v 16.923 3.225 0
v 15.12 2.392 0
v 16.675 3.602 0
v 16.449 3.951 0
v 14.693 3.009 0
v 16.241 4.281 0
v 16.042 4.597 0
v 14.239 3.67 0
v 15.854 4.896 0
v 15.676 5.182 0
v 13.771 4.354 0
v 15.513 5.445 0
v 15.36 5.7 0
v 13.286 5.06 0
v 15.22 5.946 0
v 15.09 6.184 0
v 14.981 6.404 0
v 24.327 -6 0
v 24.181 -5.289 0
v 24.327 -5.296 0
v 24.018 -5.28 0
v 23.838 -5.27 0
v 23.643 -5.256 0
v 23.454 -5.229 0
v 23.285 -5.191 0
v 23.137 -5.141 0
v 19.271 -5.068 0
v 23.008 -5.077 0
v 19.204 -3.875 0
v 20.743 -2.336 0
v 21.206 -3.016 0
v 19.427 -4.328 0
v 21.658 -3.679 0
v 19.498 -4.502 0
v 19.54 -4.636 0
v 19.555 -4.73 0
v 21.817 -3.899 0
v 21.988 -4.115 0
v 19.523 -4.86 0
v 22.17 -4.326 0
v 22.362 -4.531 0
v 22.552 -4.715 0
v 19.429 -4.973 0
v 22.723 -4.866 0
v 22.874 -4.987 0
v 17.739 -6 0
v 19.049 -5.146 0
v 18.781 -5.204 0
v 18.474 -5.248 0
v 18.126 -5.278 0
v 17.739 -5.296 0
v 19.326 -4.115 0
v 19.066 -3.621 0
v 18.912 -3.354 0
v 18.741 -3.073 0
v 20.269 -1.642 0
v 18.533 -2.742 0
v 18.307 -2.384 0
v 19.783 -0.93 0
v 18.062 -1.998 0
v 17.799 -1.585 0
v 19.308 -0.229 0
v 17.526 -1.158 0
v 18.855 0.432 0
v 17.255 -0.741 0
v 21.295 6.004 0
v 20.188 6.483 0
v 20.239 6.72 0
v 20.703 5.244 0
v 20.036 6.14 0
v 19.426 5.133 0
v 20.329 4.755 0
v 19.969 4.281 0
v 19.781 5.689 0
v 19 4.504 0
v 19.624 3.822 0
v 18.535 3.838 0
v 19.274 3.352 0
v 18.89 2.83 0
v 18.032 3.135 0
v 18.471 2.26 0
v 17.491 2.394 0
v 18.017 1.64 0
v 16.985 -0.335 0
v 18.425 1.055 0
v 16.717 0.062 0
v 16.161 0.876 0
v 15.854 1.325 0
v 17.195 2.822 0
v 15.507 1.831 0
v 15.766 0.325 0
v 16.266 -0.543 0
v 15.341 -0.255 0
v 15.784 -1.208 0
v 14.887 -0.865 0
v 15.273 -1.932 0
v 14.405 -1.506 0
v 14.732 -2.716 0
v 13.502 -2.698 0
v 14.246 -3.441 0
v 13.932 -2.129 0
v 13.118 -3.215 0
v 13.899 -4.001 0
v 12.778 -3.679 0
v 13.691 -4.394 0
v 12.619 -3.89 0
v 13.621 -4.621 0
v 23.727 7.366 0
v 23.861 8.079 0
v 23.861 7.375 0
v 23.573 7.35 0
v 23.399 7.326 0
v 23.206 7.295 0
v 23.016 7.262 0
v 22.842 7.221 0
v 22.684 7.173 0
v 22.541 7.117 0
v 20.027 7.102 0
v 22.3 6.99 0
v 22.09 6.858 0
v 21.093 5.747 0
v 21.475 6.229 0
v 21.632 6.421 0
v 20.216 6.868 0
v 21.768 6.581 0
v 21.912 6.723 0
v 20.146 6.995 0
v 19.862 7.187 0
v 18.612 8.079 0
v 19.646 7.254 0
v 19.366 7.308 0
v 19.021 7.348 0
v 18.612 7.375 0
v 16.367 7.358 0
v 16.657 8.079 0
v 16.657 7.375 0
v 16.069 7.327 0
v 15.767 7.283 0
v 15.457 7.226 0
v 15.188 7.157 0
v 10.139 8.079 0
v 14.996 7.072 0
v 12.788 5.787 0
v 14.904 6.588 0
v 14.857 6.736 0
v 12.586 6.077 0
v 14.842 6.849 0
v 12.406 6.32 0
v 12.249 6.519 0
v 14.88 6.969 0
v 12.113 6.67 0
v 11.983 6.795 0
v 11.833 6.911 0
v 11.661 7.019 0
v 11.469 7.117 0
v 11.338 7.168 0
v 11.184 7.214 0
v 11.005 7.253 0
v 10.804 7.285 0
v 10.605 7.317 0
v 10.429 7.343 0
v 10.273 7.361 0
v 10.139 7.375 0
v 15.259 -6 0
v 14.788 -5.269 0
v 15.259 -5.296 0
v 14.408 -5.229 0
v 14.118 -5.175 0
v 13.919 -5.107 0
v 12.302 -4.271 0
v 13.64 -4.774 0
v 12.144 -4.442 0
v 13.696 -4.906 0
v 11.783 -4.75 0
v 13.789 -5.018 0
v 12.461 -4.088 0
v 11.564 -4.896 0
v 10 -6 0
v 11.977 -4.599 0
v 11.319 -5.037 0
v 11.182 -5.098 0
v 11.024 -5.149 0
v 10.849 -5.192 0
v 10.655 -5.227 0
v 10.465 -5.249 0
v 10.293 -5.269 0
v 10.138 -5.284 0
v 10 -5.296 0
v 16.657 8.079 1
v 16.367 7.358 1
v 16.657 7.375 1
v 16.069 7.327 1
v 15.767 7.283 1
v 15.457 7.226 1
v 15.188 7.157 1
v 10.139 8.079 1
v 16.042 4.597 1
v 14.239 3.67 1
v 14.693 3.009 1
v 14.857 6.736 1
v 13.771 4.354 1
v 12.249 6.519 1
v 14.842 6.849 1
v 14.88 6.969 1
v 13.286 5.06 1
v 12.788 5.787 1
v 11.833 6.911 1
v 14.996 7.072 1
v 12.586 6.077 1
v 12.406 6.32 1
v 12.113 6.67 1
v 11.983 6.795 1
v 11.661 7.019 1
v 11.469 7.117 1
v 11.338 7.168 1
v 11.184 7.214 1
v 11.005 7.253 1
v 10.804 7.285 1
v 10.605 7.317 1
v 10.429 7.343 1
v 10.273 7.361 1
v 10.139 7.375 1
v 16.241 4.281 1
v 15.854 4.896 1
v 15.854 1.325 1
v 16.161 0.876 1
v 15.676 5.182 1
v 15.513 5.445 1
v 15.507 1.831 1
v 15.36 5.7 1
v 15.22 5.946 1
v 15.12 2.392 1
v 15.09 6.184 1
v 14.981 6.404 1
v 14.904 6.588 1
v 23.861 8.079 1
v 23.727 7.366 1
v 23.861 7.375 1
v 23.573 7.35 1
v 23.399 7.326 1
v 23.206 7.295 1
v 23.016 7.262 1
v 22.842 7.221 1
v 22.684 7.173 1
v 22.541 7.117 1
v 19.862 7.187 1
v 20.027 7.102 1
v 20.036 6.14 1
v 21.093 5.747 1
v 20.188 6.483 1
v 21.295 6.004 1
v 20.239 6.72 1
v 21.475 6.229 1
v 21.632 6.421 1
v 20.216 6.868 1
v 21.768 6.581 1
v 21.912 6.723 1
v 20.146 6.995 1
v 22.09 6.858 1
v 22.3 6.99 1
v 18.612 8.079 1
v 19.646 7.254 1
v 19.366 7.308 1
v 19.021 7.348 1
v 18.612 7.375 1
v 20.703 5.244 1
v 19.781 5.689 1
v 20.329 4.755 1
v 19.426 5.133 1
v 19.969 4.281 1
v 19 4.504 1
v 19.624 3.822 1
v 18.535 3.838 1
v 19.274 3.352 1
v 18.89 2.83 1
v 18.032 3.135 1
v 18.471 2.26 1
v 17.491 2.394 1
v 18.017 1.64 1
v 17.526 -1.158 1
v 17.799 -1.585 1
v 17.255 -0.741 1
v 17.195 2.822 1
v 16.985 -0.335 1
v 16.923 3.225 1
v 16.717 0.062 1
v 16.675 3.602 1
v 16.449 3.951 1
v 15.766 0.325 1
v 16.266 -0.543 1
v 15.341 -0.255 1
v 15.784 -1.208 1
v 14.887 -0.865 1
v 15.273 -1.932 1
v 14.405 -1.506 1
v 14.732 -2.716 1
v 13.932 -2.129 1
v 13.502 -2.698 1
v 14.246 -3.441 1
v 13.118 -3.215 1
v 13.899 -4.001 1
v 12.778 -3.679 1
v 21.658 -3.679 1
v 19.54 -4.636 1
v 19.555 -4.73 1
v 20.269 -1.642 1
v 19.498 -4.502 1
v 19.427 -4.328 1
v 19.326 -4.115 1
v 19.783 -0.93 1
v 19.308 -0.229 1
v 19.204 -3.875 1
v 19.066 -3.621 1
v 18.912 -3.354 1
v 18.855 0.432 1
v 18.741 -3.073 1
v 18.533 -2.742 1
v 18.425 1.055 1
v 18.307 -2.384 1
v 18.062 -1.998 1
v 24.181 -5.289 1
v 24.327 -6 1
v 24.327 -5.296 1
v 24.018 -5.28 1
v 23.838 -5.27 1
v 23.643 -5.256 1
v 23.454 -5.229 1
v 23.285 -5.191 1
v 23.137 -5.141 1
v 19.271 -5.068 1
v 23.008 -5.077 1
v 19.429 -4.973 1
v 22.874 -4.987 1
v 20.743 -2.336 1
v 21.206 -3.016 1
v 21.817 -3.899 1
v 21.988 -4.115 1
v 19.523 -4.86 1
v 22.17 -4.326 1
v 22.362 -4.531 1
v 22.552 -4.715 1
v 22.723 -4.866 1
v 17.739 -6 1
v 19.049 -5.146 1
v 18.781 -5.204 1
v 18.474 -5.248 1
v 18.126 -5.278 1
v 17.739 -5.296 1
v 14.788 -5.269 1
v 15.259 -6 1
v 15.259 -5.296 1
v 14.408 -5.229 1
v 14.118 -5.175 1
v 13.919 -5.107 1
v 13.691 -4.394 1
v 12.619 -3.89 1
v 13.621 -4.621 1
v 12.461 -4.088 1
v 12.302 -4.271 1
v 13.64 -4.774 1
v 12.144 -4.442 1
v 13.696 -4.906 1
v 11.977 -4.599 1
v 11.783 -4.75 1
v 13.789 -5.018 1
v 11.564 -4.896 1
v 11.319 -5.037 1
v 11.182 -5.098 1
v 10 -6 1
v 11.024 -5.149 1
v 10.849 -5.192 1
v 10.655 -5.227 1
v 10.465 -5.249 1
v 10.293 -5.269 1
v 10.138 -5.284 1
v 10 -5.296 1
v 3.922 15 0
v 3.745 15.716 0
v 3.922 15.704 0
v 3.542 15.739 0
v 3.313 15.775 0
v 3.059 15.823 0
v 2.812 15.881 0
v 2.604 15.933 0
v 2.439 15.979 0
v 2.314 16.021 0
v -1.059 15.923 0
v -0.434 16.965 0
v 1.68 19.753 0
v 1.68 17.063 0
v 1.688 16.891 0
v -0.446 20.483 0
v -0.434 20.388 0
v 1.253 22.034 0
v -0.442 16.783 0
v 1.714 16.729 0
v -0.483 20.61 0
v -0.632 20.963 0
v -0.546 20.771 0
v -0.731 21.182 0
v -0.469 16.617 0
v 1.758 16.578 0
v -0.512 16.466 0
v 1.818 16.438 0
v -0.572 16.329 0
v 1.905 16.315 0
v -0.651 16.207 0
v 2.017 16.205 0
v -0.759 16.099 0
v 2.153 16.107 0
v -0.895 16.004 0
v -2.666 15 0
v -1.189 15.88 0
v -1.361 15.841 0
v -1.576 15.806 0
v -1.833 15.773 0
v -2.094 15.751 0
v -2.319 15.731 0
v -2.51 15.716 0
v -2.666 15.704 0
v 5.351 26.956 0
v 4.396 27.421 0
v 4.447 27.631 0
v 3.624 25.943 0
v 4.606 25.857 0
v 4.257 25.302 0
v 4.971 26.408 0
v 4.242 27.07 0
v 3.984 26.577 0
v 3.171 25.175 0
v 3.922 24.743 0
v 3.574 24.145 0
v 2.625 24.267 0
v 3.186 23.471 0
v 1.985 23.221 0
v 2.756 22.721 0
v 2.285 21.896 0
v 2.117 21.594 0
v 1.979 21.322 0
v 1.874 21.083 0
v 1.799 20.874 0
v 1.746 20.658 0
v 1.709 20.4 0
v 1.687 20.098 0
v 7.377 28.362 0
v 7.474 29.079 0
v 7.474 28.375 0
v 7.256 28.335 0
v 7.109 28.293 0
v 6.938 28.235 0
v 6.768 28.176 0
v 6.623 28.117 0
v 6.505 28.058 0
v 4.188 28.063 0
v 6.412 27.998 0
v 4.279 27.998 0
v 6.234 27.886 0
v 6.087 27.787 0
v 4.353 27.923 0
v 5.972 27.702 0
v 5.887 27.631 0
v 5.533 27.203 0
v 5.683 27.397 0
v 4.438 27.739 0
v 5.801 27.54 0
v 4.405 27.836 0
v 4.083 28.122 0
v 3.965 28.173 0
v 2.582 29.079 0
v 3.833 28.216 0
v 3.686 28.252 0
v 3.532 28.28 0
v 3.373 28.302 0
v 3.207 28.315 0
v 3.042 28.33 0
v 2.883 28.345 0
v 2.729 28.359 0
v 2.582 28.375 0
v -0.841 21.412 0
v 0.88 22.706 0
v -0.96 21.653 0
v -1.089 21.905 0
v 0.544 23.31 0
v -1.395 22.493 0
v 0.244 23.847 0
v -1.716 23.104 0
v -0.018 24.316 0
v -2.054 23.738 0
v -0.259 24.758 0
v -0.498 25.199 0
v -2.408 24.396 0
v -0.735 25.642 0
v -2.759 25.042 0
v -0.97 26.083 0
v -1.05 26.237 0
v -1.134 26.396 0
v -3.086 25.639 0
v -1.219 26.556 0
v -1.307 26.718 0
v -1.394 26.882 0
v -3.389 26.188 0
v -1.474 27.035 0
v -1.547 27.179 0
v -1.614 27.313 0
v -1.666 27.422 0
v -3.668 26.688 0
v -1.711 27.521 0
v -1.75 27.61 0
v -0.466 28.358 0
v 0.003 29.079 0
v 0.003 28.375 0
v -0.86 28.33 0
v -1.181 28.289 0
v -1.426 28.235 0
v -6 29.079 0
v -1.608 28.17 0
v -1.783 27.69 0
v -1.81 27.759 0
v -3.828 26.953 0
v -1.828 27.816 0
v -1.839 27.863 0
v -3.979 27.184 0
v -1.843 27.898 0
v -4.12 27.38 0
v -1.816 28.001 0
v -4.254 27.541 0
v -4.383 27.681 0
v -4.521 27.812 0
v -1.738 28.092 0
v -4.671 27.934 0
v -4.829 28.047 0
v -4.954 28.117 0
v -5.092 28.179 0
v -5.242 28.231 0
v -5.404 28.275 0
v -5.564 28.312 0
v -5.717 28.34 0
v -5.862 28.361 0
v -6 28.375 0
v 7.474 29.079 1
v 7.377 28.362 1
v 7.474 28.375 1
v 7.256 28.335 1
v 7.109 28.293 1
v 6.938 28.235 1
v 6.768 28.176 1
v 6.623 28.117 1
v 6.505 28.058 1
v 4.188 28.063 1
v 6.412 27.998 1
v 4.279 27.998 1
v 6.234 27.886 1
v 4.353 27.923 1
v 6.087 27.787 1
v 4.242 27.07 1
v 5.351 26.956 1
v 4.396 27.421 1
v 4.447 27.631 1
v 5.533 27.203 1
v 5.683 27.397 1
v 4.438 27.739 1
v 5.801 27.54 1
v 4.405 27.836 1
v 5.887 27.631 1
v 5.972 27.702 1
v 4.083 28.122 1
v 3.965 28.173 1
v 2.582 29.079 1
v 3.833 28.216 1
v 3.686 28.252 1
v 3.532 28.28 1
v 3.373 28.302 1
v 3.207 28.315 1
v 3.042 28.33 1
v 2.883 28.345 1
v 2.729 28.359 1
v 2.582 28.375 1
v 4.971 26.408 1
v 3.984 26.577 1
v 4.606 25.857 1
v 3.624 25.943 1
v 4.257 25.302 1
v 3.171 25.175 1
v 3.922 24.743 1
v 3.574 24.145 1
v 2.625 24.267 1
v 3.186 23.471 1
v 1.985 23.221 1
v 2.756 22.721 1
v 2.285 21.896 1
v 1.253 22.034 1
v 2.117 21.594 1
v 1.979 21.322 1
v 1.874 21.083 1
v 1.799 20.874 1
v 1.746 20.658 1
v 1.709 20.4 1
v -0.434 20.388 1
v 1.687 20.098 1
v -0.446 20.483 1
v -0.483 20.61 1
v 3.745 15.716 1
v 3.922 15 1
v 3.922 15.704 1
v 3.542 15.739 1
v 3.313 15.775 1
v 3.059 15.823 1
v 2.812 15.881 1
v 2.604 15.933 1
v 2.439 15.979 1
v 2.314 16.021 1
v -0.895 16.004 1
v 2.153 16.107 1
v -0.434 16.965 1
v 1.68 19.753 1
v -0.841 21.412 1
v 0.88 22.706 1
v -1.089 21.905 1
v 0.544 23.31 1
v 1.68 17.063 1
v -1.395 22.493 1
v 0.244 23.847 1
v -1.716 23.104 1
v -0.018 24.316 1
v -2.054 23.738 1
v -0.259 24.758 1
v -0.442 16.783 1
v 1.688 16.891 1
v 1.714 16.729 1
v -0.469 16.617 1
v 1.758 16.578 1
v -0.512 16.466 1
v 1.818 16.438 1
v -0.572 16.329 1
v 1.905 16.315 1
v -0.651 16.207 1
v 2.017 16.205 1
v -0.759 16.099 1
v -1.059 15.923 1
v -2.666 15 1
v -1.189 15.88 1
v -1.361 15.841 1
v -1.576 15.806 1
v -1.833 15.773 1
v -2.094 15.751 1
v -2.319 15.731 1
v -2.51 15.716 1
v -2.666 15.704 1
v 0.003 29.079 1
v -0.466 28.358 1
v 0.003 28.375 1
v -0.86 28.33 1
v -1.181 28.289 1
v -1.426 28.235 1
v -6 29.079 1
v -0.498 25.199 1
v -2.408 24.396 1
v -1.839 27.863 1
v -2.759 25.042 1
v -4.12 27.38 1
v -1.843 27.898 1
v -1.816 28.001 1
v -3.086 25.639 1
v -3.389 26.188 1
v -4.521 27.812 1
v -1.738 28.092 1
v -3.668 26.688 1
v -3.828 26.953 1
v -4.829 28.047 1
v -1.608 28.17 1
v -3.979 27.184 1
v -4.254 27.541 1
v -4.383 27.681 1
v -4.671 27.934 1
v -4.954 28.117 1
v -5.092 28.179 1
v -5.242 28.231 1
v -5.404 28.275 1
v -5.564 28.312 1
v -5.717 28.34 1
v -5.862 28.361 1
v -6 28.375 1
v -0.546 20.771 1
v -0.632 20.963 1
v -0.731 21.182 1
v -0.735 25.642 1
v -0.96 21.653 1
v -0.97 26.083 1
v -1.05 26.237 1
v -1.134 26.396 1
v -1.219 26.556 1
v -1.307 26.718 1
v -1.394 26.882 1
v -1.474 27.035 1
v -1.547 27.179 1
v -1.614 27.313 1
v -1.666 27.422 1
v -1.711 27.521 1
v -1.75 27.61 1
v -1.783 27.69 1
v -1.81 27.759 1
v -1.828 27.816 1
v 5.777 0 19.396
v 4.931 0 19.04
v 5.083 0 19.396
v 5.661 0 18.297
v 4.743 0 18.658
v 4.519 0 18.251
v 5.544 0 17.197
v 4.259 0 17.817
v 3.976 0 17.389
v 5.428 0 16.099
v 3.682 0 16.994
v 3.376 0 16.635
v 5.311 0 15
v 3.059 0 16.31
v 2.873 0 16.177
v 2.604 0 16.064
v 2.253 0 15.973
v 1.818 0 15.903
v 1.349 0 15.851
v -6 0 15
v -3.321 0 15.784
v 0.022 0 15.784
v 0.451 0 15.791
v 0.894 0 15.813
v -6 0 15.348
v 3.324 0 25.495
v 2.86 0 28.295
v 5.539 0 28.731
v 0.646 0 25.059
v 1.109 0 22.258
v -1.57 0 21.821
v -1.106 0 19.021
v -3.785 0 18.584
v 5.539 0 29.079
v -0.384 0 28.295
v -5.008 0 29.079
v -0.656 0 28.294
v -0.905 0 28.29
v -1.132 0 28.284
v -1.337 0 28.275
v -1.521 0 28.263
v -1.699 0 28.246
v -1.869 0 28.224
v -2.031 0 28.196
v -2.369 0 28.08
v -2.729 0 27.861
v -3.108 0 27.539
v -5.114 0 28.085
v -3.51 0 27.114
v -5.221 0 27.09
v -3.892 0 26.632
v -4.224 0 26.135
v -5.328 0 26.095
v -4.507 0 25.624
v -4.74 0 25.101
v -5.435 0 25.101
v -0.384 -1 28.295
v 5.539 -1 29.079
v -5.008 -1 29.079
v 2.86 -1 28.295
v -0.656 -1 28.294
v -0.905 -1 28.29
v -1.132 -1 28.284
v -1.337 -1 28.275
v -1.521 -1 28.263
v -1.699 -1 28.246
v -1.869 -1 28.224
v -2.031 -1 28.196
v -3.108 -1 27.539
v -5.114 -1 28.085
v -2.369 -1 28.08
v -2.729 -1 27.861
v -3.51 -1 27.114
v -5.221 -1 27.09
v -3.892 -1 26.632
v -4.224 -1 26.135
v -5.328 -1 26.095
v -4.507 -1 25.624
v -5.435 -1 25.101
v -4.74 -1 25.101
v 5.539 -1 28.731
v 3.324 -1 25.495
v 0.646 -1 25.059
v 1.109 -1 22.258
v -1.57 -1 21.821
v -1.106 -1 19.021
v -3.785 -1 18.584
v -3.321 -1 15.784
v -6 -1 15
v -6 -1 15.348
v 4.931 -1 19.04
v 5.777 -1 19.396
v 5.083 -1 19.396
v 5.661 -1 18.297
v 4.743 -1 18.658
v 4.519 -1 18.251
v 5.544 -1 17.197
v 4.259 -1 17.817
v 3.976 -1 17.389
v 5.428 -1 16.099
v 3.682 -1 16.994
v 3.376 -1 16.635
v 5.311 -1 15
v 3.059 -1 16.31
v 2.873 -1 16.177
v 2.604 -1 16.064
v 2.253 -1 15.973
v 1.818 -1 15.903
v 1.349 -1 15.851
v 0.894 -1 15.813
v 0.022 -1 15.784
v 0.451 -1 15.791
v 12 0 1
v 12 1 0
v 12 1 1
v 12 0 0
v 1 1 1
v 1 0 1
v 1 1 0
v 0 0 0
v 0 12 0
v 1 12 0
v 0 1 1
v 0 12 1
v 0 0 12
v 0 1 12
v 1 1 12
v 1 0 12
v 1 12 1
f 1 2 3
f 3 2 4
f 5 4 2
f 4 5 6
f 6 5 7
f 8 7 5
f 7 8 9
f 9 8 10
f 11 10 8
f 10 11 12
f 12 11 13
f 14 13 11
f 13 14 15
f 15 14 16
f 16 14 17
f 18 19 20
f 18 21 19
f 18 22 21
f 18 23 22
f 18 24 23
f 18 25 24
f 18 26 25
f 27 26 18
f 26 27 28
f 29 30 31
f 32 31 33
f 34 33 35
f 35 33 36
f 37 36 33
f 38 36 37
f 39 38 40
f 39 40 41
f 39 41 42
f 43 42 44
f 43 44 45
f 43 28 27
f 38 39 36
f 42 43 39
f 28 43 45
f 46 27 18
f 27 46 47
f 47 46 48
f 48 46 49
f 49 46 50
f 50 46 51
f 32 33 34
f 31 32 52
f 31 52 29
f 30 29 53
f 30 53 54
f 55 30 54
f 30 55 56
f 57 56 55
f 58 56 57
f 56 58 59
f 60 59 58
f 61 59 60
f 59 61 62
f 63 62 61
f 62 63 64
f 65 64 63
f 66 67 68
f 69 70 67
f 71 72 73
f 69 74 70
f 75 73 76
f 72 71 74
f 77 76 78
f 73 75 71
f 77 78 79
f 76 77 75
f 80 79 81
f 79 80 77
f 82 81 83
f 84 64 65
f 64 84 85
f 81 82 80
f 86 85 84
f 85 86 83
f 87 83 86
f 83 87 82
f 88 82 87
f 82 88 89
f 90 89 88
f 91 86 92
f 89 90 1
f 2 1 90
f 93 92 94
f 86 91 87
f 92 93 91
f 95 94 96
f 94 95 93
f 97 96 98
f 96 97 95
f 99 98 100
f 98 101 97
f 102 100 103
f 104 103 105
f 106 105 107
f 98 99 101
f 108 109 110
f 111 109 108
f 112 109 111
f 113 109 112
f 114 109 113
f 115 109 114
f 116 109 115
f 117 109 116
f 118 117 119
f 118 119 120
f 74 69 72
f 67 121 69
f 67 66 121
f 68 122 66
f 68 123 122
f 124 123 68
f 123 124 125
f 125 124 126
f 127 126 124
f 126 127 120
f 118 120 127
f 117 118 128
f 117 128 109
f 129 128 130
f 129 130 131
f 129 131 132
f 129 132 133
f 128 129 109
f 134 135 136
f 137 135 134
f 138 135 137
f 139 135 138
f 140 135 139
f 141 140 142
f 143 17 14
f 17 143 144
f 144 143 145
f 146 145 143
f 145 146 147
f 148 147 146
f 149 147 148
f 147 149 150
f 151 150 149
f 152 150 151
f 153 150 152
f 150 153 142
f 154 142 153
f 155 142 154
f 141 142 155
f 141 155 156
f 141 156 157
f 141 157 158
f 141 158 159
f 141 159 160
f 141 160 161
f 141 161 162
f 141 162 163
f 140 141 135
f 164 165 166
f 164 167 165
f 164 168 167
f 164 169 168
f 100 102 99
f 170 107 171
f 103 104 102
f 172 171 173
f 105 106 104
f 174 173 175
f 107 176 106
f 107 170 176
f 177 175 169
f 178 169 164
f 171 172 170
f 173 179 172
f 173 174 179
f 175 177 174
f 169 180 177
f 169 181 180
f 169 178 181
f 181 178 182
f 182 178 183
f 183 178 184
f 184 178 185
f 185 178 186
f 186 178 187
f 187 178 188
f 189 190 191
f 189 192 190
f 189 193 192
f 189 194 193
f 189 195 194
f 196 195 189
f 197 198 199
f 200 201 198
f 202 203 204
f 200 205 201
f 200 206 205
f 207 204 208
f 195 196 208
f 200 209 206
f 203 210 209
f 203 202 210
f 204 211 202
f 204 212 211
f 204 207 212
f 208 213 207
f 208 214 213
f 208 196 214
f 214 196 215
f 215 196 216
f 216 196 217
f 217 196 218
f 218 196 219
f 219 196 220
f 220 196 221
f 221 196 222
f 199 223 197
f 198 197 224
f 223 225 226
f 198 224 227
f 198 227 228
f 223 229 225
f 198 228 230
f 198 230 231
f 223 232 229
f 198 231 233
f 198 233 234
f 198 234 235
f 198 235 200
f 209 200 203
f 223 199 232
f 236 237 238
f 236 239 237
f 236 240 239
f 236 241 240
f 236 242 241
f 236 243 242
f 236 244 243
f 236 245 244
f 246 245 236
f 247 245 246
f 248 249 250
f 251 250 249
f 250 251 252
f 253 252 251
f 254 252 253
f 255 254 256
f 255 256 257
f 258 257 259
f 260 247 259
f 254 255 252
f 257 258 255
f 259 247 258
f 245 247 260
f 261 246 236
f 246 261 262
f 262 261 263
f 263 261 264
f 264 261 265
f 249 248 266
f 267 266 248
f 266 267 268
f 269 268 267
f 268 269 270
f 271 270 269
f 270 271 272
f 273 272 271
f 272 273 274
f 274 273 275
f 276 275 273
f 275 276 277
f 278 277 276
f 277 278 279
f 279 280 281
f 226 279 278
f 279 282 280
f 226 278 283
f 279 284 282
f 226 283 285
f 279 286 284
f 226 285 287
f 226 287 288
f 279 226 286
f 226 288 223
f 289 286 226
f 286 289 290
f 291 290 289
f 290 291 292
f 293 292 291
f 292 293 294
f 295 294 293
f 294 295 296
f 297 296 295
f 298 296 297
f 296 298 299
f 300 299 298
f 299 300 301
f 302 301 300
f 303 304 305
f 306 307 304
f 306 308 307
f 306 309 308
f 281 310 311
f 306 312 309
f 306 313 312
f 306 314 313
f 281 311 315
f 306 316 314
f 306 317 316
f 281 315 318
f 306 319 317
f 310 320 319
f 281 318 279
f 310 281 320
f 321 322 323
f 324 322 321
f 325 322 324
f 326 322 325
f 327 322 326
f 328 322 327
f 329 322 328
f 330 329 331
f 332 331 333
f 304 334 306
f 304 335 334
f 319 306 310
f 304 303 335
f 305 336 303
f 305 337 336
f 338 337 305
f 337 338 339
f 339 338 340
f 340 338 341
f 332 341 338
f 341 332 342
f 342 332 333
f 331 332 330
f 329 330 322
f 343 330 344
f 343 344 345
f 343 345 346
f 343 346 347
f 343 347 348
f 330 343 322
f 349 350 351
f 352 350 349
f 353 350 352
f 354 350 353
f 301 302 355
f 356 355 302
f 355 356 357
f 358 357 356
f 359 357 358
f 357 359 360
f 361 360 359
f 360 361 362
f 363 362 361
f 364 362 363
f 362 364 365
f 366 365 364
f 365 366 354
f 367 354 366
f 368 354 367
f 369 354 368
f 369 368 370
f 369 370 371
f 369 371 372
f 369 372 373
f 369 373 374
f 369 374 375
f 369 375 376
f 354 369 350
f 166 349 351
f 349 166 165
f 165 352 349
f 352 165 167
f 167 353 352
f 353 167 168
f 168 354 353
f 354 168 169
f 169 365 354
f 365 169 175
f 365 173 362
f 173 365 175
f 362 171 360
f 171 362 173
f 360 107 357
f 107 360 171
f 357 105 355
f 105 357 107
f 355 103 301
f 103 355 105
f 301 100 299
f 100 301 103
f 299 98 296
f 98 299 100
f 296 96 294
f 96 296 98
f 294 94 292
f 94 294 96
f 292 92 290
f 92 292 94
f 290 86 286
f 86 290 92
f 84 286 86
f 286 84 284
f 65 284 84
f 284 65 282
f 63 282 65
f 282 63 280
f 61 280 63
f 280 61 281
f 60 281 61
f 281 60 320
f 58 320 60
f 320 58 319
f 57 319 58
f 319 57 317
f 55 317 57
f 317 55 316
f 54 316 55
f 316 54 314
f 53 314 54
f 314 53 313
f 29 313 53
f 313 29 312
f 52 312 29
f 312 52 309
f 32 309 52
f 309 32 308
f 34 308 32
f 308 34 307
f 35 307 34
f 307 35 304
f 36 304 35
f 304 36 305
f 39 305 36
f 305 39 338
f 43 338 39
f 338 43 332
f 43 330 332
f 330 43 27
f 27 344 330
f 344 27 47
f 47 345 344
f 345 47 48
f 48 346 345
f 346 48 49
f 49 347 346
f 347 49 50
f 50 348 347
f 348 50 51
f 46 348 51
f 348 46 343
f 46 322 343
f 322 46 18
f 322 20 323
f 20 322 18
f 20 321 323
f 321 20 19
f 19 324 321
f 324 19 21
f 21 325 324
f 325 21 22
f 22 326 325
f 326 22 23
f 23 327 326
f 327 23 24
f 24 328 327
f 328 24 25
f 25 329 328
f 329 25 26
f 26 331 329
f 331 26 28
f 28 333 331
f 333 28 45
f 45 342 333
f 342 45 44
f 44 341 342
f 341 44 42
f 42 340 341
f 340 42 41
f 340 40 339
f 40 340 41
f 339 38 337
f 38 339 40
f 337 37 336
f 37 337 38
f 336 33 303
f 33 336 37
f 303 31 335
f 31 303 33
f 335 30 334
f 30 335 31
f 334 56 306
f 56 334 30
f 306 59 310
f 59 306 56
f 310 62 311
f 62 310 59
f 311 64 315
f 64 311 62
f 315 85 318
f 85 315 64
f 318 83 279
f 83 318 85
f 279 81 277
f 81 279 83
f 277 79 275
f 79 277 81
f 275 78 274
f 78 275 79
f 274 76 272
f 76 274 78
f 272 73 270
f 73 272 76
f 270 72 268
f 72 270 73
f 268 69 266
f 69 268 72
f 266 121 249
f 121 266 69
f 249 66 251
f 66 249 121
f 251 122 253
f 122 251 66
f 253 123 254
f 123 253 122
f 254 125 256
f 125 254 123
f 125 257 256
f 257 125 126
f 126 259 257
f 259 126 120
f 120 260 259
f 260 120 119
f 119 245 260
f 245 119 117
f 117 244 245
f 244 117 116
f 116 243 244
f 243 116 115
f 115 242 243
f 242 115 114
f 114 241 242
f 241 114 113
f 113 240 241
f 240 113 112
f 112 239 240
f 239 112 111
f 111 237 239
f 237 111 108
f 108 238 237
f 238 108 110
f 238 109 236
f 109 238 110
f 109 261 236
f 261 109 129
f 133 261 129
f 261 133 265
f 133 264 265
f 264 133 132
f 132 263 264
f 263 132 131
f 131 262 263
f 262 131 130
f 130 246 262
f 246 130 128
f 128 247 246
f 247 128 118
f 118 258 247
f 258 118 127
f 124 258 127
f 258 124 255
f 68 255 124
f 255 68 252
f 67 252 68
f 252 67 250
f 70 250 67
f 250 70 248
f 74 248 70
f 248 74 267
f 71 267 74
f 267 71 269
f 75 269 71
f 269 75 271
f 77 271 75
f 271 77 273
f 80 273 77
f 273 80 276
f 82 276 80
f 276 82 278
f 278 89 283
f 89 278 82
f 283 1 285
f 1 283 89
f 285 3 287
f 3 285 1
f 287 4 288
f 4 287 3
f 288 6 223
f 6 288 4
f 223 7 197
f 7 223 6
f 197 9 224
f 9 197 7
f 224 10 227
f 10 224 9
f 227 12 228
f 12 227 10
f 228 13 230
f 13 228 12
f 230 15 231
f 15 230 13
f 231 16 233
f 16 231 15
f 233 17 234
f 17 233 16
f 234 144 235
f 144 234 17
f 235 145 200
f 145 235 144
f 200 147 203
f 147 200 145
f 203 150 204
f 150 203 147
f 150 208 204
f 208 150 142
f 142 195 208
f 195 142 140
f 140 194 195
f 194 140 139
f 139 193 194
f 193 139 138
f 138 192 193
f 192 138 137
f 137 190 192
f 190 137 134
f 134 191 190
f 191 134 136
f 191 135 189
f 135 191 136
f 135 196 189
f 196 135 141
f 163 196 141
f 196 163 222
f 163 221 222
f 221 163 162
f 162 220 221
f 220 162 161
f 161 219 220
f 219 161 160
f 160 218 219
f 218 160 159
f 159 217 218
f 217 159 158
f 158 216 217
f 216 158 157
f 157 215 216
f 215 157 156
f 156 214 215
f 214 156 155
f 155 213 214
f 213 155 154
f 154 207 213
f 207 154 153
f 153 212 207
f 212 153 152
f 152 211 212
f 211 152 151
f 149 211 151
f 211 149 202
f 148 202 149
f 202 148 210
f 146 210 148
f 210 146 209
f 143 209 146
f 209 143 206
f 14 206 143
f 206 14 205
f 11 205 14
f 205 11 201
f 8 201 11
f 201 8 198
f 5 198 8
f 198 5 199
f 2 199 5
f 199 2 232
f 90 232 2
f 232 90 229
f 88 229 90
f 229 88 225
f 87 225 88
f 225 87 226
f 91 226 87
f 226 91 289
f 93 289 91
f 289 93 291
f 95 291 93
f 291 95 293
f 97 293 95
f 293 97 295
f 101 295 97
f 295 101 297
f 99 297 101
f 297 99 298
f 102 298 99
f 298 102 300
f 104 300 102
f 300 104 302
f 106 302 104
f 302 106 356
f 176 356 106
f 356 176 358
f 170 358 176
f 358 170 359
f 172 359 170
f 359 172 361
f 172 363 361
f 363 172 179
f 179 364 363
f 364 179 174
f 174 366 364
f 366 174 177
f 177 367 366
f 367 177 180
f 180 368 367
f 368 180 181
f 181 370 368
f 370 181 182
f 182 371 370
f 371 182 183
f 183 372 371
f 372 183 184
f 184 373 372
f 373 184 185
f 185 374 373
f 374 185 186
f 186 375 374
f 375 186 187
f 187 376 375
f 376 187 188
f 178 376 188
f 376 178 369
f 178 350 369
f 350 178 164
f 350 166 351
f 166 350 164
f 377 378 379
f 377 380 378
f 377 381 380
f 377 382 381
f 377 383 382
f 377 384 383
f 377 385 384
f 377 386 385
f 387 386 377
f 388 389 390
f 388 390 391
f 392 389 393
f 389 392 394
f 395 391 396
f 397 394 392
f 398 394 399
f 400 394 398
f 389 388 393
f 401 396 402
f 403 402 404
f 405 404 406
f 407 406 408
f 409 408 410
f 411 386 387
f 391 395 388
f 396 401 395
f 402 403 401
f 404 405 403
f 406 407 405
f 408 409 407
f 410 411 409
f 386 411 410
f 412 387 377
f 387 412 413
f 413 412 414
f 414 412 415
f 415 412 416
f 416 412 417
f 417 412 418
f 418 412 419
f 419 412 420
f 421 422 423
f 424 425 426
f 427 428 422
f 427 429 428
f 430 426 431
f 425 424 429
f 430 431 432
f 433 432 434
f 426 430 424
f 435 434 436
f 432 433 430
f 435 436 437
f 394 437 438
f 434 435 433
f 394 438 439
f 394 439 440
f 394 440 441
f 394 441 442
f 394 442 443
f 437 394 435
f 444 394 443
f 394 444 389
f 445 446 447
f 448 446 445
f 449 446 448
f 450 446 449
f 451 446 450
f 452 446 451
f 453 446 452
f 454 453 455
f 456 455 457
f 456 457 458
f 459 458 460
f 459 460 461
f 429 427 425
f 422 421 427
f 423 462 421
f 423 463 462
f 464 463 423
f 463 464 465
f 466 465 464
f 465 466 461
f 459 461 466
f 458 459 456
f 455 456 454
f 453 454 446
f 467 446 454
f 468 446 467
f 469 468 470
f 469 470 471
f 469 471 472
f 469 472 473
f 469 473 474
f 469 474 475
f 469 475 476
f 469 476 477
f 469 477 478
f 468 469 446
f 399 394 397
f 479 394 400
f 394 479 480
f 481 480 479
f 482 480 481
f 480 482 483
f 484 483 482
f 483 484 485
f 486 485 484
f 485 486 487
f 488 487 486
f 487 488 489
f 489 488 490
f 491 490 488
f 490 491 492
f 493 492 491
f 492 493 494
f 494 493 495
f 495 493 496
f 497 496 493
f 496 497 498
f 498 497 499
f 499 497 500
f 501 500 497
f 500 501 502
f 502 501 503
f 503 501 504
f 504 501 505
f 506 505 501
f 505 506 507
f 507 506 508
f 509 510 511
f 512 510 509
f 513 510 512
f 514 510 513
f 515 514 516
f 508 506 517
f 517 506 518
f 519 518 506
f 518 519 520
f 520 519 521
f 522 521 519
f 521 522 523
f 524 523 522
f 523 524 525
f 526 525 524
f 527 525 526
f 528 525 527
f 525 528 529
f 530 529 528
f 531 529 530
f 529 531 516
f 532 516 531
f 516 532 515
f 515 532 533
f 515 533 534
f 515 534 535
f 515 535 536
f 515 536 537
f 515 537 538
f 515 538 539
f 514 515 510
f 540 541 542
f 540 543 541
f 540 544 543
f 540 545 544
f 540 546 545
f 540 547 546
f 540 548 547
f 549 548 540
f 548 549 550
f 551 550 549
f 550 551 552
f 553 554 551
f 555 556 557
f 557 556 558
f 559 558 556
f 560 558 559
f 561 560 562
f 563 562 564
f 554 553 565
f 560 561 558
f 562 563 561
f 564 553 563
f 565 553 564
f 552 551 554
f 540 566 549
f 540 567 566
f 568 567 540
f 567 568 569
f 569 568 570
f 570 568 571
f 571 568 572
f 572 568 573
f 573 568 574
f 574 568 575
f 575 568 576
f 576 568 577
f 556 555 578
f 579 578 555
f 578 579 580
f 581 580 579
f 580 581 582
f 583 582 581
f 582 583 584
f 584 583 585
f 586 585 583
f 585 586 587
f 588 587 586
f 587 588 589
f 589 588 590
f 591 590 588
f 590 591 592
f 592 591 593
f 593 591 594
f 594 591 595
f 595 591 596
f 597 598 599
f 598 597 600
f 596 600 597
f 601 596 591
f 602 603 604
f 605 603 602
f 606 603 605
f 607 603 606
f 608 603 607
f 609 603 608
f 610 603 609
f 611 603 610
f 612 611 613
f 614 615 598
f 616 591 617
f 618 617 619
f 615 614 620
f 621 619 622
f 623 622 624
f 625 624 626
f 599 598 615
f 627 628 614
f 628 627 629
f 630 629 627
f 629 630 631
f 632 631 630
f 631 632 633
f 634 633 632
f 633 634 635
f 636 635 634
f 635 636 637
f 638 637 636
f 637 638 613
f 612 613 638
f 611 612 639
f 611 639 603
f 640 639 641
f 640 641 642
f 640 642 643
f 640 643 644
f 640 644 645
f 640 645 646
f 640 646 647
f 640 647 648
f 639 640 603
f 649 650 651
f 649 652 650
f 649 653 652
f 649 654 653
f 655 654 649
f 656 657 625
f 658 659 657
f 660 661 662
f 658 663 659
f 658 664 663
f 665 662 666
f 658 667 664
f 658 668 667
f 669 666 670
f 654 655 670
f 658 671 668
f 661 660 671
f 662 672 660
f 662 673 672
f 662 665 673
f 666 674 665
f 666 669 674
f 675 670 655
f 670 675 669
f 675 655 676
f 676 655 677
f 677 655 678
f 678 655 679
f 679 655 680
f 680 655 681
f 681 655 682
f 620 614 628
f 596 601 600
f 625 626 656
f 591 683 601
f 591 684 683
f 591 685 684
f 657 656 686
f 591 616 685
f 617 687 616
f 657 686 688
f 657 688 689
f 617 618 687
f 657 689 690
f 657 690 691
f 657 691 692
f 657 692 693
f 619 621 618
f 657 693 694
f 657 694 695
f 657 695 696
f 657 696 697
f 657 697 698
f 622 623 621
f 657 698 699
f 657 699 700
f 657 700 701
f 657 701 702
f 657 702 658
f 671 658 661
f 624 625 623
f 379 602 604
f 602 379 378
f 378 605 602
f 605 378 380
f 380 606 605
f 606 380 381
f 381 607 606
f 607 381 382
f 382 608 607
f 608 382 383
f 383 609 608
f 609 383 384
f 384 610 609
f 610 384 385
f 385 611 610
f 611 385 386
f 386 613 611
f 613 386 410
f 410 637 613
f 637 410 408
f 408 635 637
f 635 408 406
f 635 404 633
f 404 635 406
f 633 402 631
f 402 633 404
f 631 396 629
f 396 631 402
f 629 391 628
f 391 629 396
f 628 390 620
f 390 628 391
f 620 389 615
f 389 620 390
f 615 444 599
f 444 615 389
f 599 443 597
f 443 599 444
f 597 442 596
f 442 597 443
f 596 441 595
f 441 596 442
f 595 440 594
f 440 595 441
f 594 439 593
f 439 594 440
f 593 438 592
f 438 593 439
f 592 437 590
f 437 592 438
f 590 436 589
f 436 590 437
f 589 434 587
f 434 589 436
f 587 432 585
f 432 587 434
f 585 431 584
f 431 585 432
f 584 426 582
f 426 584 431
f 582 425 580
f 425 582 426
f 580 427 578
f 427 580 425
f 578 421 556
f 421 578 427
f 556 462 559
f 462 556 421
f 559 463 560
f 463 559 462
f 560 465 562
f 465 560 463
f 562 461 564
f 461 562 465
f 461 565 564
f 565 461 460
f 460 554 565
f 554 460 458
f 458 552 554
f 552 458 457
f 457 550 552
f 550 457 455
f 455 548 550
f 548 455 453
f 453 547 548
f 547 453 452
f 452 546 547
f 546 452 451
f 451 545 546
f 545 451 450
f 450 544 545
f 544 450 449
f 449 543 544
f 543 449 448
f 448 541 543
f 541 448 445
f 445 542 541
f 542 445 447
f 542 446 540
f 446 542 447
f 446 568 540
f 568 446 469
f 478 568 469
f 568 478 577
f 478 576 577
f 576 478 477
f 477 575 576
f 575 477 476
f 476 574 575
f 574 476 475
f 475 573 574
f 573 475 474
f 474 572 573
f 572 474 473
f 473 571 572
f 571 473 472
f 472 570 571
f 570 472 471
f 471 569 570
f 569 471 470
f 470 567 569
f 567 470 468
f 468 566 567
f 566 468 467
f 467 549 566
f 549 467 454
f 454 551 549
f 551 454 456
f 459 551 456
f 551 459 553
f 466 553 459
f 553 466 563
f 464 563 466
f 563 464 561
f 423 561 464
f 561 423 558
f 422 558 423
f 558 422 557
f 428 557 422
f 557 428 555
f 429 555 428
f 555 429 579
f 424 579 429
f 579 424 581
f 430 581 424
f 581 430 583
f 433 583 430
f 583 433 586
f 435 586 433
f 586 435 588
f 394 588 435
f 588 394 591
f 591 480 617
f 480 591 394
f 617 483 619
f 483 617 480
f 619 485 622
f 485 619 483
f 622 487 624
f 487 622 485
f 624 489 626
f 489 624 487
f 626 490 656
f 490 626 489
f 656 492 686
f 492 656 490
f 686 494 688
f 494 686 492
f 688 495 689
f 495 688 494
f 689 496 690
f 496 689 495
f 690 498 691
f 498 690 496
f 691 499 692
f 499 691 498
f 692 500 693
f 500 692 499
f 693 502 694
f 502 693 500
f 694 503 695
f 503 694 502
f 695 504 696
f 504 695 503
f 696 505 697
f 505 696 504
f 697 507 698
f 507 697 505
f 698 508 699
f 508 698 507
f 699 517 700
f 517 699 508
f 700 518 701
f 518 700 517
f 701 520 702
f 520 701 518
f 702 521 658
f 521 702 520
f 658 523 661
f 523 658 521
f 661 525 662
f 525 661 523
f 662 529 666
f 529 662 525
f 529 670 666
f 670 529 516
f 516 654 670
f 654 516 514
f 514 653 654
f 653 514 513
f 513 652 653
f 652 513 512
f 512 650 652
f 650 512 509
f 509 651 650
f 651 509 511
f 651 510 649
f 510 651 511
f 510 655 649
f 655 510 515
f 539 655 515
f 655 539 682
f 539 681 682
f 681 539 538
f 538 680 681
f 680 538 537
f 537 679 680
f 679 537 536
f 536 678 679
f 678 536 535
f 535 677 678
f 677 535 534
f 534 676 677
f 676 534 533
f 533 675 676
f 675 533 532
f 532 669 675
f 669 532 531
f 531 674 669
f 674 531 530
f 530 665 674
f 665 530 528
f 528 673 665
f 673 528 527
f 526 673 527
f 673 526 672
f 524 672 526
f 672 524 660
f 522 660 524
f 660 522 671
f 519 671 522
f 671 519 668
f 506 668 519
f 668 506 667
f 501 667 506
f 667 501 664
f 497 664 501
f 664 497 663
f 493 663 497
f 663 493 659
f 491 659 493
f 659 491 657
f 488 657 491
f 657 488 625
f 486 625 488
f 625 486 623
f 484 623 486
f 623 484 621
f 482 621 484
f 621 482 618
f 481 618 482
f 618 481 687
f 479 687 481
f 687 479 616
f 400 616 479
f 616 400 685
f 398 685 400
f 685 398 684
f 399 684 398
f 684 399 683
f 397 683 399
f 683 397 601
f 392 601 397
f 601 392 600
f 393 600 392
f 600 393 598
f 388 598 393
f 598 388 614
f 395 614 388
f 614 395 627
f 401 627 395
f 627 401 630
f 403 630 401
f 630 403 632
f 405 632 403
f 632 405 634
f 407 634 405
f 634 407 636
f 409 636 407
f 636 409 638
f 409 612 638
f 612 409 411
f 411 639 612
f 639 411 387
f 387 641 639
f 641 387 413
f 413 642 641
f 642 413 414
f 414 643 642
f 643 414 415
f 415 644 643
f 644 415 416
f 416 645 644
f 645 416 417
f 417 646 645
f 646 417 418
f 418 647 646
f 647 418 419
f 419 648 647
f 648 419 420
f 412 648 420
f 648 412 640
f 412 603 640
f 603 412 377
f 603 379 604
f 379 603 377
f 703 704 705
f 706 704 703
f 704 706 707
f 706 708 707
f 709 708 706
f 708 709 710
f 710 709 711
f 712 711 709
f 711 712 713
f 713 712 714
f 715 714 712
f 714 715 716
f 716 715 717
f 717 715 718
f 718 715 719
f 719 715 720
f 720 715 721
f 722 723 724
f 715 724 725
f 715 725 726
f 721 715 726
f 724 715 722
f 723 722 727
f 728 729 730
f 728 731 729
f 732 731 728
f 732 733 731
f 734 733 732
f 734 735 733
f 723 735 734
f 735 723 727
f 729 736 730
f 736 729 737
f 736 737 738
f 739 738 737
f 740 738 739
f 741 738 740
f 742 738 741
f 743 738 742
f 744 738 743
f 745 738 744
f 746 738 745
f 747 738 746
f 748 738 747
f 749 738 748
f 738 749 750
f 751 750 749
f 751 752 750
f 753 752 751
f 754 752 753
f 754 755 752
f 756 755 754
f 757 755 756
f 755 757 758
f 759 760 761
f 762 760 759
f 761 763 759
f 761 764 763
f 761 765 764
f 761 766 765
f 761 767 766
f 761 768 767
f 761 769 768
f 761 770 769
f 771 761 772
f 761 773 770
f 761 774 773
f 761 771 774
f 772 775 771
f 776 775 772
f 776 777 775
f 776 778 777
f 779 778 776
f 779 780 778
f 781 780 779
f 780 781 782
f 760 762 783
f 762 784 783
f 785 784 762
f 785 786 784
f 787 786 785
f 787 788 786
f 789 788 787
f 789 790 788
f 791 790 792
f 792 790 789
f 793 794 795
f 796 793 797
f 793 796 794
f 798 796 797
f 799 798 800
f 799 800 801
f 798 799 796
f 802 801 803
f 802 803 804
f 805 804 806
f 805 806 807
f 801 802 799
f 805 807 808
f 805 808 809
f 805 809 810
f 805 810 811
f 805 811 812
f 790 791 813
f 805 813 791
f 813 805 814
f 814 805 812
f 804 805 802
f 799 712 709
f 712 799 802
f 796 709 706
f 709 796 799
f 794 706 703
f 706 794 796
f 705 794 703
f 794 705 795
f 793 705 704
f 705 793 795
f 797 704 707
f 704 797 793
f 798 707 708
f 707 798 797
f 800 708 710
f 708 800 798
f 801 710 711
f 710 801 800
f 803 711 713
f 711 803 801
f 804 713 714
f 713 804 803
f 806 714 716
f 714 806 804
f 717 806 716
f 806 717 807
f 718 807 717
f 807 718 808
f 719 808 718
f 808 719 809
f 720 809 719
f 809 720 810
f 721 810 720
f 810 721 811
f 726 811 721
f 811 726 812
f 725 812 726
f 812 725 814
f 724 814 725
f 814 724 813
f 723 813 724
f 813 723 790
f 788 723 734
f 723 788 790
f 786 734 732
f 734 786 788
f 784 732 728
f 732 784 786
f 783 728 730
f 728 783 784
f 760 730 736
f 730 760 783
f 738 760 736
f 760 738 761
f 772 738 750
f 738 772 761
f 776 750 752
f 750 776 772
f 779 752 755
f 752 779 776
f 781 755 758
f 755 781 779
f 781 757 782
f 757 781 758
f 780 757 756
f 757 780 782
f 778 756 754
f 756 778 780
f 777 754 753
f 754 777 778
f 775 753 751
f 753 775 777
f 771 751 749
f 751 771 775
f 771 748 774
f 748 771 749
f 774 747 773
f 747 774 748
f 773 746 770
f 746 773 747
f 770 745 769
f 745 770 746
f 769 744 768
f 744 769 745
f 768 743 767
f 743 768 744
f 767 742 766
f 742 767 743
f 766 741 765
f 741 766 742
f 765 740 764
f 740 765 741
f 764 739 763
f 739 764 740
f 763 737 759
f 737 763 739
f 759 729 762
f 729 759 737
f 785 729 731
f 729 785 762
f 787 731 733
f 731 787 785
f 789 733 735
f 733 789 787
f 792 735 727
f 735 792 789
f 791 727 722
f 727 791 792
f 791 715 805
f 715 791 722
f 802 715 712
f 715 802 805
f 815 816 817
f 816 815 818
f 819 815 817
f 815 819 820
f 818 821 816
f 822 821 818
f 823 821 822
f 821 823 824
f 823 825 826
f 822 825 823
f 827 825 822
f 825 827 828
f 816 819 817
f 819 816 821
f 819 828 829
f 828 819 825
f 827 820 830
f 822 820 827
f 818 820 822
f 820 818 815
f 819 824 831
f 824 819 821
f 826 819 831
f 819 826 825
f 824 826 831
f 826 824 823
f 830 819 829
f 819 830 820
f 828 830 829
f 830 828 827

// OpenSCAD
/*
 * Show the axes, using imported text.
 * This is not a great solution.
 */

translate([10,-6,0]) linear_extrude(height=1) import("x.dxf");
translate([-6,15,0]) linear_extrude(height=1) import("y.dxf");
translate([-6,0,15]) rotate([90,0,0]) linear_extrude(height=1) import("z.dxf");

cube([12,1,1]);
cube([1,12,1]);
cube([1,1,12]);
